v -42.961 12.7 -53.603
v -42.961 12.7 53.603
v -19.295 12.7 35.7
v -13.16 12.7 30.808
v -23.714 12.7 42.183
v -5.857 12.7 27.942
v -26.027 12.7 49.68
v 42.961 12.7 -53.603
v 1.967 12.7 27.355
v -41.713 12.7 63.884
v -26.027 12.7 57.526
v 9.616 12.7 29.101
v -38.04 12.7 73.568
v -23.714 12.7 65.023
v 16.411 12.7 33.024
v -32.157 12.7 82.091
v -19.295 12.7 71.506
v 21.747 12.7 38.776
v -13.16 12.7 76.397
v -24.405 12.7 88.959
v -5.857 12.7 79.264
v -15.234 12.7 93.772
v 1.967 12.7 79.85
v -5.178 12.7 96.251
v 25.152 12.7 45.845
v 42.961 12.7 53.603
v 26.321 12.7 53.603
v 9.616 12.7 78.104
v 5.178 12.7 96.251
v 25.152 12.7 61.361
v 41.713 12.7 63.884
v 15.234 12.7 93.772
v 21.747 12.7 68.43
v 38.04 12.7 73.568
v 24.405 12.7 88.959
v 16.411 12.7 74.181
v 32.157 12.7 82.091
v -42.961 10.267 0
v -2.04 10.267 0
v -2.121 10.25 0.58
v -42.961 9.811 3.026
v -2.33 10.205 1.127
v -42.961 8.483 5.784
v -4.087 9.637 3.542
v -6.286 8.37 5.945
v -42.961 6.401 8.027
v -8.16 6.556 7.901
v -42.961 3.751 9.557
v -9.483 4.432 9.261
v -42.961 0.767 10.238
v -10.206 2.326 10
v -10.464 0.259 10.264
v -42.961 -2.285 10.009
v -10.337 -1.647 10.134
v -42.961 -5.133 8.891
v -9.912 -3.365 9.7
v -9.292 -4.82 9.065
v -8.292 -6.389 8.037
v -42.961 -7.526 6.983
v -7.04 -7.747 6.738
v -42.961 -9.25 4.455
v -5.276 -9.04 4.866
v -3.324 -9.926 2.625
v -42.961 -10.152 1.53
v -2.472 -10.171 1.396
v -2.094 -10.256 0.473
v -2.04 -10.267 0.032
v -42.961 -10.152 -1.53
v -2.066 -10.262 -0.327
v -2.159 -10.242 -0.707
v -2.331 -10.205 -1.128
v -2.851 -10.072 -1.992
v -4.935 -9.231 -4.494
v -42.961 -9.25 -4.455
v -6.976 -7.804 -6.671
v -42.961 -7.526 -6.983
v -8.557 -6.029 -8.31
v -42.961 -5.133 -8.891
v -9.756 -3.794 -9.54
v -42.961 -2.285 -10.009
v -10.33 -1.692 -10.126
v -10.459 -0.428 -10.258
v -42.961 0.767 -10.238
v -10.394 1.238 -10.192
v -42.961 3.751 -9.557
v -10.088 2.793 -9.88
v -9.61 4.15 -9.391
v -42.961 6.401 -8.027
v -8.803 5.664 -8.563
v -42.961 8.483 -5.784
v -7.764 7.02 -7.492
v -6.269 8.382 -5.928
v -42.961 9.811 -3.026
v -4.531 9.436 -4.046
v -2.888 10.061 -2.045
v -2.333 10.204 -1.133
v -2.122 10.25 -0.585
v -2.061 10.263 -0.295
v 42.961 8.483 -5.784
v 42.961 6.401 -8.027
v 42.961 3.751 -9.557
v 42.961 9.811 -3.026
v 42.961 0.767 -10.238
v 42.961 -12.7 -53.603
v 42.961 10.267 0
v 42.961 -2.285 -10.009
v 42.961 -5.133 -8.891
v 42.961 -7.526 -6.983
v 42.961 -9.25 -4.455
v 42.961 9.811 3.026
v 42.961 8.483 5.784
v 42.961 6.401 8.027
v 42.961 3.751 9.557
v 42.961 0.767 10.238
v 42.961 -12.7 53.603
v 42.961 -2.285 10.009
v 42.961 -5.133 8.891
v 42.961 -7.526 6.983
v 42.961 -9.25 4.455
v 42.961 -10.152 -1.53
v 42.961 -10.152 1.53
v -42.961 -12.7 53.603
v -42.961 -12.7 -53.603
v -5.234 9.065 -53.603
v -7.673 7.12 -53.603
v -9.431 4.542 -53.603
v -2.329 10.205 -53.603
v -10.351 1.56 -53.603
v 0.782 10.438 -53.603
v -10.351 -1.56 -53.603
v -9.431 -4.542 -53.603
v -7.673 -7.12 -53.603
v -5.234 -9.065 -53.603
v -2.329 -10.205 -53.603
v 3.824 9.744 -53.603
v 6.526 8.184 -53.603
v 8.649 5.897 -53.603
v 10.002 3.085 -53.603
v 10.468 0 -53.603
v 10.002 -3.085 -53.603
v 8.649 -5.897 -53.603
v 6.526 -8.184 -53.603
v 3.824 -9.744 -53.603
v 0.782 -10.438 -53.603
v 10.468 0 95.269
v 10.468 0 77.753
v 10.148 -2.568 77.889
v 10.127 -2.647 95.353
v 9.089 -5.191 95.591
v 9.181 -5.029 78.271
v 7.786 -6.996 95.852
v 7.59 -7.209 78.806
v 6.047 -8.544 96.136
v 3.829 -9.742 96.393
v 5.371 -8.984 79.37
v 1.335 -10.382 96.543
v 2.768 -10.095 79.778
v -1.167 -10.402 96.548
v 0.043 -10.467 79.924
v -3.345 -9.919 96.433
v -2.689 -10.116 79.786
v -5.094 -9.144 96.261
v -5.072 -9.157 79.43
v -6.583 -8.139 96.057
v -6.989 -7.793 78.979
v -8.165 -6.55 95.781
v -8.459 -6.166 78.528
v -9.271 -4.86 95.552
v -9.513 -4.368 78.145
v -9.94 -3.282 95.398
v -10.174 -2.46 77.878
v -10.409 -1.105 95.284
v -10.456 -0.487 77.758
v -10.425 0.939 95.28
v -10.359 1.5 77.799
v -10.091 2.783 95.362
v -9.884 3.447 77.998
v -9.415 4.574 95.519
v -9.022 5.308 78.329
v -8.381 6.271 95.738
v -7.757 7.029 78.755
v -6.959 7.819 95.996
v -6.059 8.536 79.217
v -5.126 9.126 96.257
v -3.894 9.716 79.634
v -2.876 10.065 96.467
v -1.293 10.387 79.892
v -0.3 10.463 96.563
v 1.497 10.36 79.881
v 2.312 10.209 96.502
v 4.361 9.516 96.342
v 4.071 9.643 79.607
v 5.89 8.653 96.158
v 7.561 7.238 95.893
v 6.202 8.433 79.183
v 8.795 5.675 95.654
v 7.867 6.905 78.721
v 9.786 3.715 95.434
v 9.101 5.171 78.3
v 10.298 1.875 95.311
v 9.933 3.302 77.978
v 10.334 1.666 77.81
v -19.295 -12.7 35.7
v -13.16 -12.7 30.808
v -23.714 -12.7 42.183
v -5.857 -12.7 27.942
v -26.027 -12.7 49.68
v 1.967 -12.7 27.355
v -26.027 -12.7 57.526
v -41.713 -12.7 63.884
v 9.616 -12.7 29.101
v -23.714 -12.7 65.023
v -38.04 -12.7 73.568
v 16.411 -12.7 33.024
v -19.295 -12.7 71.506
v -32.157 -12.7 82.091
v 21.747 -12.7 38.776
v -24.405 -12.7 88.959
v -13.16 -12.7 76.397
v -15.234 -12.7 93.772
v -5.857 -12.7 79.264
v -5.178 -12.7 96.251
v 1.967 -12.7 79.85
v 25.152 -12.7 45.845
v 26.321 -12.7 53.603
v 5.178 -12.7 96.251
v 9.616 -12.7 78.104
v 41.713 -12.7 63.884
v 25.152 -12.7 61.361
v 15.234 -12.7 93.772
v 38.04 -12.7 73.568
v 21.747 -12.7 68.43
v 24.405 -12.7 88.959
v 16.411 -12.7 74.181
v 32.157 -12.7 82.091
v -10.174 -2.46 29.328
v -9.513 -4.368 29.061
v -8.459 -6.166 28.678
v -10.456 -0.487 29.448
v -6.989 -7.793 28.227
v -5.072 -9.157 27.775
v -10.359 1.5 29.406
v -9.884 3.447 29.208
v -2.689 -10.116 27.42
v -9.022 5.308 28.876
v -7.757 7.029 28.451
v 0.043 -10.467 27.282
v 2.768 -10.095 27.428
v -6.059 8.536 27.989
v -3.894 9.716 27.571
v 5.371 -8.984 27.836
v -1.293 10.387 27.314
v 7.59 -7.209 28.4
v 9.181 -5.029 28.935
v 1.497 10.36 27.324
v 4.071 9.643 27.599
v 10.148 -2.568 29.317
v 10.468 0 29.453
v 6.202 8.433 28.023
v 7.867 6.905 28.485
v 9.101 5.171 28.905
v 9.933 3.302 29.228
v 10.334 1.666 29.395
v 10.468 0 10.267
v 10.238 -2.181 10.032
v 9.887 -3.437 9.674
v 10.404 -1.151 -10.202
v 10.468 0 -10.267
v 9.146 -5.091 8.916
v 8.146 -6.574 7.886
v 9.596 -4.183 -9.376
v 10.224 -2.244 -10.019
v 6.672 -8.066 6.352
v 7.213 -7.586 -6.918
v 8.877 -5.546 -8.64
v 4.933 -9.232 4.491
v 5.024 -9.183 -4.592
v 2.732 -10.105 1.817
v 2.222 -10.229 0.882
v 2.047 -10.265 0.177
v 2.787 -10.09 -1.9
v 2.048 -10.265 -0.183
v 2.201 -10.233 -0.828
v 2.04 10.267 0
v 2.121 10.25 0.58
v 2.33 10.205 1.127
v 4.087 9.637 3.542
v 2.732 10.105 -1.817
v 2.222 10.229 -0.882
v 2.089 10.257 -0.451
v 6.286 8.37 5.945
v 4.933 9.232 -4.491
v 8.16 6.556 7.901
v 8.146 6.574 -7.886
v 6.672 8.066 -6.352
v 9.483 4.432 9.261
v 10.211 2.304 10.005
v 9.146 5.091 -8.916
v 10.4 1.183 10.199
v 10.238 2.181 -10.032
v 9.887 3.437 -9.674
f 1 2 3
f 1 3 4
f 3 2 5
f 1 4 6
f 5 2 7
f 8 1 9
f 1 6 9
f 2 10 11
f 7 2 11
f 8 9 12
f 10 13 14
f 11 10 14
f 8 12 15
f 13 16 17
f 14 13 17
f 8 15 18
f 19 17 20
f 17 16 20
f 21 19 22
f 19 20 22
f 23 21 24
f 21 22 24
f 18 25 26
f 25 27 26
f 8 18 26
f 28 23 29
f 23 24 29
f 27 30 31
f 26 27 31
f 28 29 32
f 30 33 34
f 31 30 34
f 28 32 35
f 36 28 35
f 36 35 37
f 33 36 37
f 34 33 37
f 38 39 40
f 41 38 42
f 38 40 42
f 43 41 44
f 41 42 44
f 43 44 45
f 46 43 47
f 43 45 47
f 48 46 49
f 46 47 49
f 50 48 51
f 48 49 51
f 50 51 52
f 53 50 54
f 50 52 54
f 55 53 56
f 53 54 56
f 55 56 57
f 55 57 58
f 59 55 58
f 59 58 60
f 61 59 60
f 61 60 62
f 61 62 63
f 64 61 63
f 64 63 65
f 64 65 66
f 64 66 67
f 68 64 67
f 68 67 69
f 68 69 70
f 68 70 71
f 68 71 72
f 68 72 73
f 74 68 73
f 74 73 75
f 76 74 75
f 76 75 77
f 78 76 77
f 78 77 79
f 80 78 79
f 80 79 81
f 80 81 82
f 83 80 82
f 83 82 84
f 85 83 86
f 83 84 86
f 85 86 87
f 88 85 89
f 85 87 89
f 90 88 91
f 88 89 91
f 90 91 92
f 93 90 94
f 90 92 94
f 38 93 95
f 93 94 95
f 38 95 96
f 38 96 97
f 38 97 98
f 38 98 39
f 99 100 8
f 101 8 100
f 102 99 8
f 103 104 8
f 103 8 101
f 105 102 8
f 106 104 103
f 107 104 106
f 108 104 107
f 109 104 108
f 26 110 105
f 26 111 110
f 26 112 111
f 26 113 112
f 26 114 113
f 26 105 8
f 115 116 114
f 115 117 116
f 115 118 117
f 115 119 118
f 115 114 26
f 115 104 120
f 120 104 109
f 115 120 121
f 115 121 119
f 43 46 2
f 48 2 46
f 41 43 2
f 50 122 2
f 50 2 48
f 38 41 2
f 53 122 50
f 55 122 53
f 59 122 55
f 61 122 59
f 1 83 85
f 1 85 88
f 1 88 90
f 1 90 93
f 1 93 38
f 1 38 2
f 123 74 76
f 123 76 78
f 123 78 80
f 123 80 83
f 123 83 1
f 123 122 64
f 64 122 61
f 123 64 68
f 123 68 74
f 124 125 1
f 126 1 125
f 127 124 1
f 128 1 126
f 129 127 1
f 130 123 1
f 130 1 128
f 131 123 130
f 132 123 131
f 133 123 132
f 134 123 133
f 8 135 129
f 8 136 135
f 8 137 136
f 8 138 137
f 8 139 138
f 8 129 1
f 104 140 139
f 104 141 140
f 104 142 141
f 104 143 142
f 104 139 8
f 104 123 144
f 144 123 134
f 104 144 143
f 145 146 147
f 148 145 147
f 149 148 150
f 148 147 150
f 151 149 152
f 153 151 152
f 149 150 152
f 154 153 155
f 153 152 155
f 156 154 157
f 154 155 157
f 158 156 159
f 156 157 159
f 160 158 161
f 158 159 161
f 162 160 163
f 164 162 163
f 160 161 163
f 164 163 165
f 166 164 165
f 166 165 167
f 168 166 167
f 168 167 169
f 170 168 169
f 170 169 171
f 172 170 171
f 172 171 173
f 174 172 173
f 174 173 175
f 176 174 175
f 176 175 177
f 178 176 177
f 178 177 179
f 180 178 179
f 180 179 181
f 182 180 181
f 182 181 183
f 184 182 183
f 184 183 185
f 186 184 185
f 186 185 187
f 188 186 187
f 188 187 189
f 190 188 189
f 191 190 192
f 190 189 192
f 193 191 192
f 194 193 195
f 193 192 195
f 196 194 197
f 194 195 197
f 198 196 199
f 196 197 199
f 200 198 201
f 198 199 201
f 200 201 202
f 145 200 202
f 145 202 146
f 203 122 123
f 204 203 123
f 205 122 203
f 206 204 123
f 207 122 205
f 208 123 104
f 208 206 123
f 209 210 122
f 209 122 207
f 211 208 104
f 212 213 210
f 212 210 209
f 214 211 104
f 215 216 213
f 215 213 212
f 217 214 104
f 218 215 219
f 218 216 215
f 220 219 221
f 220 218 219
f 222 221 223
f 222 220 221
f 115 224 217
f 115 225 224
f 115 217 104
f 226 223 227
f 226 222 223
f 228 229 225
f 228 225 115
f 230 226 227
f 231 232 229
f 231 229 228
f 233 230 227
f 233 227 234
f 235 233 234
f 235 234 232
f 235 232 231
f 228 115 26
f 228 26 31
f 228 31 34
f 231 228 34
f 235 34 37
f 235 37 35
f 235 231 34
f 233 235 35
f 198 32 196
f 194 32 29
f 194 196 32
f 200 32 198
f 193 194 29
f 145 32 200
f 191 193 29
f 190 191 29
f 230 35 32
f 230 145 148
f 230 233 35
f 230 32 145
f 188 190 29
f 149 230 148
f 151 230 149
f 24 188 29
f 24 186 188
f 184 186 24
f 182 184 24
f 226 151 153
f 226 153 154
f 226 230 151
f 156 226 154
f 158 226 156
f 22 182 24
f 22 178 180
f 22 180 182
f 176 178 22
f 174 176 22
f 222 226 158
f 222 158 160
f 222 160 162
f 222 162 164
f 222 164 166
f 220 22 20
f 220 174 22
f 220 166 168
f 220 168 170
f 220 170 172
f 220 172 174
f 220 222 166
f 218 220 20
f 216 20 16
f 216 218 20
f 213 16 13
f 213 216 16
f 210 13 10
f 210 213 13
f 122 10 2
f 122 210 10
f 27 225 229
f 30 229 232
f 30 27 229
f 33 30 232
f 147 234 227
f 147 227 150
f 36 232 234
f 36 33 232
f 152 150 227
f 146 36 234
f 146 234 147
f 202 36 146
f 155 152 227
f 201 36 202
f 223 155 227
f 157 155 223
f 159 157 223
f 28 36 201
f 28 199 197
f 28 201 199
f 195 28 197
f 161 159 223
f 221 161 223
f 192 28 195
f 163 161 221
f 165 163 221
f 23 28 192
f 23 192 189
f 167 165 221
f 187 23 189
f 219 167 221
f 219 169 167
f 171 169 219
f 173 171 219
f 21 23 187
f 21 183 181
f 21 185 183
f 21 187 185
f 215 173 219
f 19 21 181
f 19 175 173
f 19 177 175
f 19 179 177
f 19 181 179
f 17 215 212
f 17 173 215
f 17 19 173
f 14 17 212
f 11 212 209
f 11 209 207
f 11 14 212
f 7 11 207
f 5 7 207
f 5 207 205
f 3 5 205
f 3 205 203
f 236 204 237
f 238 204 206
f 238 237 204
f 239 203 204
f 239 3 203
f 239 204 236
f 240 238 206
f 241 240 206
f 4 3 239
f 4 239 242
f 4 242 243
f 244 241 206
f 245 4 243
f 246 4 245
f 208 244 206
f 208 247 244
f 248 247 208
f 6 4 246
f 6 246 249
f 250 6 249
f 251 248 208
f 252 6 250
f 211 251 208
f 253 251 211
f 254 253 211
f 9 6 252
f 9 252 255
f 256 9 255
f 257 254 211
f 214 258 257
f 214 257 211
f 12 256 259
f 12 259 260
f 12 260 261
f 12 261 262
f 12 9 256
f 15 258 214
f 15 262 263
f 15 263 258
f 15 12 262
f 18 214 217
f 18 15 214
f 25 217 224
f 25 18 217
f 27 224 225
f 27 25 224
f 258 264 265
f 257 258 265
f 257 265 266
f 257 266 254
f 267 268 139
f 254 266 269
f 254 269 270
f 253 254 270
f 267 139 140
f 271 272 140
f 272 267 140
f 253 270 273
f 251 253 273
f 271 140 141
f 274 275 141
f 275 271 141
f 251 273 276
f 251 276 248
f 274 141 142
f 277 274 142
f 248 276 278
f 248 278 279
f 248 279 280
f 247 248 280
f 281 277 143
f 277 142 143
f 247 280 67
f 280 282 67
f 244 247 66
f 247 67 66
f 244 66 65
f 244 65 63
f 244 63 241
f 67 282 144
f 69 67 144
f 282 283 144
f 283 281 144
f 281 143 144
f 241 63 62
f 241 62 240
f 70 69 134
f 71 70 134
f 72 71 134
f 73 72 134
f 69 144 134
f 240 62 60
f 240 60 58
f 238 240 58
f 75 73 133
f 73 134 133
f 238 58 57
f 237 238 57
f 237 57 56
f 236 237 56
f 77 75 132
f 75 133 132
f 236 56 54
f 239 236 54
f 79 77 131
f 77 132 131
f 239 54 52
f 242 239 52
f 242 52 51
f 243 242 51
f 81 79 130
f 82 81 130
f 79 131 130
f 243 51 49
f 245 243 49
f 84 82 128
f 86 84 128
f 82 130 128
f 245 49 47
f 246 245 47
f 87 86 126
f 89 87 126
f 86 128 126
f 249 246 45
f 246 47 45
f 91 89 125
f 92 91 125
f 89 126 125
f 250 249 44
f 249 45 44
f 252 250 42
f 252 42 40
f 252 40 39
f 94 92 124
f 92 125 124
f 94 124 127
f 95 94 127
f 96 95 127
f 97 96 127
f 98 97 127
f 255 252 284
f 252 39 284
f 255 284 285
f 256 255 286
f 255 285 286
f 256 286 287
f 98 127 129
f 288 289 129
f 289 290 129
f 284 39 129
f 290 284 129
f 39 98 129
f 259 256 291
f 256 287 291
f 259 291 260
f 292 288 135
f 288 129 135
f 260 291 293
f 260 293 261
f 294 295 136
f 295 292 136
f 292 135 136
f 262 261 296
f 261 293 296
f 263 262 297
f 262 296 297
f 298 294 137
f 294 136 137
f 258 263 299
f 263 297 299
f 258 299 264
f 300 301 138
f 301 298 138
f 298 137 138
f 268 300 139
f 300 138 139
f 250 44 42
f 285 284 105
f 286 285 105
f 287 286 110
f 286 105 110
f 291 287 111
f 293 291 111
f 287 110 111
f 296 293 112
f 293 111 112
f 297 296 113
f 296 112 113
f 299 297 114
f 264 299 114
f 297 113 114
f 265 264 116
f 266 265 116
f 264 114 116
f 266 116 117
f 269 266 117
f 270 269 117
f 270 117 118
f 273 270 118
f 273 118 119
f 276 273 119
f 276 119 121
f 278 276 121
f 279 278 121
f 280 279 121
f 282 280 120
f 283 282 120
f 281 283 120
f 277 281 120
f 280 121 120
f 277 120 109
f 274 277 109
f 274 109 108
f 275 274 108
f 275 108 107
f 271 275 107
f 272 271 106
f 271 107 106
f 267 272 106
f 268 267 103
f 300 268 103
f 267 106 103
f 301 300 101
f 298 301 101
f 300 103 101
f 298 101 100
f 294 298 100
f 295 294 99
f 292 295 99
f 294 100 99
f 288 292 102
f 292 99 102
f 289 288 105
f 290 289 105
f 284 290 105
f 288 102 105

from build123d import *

# Parameters (mm, degrees)
F0_R     = 26.320977
F1_DEPTH = 12.7
F2_R     = 10.467506
F3_DEPTH = 150.167553
F4_R     = 10.266834
F5_DEPTH = 85.92307


with BuildPart() as f1:
    # F0 (on Front) → F1 (new body, symmetric)
    with BuildSketch(Plane.XZ):
        with BuildLine():
            Line((-42.961035, -53.602759), (42.961035, -53.602759))
            Line((42.961035, -53.602759), (42.961035, 53.602759))
            ThreePointArc((42.961035, 53.602759), (0, 96.563794), (-42.961035, 53.602759))
            Line((-42.961035, 53.602759), (-42.961035, -53.602759))
        make_face()
        with Locations((0, 53.602759)):
            Circle(F0_R, mode=Mode.SUBTRACT)
    extrude(amount=F1_DEPTH, both=True)

    # F2 (on face) → F3 (cut, through all)
    with BuildSketch(Plane(origin=(0, 0, -53.602759), x_dir=(1, 0, 0), z_dir=(0, 0, -1))):
        Circle(F2_R)
    extrude(amount=-F3_DEPTH, mode=Mode.SUBTRACT)

    # F4 (on face) → F5 (cut, through all)
    with BuildSketch(Plane.YZ.offset(42.961035)):
        Circle(F4_R)
    extrude(amount=-F5_DEPTH, mode=Mode.SUBTRACT)


solid = f1.part
